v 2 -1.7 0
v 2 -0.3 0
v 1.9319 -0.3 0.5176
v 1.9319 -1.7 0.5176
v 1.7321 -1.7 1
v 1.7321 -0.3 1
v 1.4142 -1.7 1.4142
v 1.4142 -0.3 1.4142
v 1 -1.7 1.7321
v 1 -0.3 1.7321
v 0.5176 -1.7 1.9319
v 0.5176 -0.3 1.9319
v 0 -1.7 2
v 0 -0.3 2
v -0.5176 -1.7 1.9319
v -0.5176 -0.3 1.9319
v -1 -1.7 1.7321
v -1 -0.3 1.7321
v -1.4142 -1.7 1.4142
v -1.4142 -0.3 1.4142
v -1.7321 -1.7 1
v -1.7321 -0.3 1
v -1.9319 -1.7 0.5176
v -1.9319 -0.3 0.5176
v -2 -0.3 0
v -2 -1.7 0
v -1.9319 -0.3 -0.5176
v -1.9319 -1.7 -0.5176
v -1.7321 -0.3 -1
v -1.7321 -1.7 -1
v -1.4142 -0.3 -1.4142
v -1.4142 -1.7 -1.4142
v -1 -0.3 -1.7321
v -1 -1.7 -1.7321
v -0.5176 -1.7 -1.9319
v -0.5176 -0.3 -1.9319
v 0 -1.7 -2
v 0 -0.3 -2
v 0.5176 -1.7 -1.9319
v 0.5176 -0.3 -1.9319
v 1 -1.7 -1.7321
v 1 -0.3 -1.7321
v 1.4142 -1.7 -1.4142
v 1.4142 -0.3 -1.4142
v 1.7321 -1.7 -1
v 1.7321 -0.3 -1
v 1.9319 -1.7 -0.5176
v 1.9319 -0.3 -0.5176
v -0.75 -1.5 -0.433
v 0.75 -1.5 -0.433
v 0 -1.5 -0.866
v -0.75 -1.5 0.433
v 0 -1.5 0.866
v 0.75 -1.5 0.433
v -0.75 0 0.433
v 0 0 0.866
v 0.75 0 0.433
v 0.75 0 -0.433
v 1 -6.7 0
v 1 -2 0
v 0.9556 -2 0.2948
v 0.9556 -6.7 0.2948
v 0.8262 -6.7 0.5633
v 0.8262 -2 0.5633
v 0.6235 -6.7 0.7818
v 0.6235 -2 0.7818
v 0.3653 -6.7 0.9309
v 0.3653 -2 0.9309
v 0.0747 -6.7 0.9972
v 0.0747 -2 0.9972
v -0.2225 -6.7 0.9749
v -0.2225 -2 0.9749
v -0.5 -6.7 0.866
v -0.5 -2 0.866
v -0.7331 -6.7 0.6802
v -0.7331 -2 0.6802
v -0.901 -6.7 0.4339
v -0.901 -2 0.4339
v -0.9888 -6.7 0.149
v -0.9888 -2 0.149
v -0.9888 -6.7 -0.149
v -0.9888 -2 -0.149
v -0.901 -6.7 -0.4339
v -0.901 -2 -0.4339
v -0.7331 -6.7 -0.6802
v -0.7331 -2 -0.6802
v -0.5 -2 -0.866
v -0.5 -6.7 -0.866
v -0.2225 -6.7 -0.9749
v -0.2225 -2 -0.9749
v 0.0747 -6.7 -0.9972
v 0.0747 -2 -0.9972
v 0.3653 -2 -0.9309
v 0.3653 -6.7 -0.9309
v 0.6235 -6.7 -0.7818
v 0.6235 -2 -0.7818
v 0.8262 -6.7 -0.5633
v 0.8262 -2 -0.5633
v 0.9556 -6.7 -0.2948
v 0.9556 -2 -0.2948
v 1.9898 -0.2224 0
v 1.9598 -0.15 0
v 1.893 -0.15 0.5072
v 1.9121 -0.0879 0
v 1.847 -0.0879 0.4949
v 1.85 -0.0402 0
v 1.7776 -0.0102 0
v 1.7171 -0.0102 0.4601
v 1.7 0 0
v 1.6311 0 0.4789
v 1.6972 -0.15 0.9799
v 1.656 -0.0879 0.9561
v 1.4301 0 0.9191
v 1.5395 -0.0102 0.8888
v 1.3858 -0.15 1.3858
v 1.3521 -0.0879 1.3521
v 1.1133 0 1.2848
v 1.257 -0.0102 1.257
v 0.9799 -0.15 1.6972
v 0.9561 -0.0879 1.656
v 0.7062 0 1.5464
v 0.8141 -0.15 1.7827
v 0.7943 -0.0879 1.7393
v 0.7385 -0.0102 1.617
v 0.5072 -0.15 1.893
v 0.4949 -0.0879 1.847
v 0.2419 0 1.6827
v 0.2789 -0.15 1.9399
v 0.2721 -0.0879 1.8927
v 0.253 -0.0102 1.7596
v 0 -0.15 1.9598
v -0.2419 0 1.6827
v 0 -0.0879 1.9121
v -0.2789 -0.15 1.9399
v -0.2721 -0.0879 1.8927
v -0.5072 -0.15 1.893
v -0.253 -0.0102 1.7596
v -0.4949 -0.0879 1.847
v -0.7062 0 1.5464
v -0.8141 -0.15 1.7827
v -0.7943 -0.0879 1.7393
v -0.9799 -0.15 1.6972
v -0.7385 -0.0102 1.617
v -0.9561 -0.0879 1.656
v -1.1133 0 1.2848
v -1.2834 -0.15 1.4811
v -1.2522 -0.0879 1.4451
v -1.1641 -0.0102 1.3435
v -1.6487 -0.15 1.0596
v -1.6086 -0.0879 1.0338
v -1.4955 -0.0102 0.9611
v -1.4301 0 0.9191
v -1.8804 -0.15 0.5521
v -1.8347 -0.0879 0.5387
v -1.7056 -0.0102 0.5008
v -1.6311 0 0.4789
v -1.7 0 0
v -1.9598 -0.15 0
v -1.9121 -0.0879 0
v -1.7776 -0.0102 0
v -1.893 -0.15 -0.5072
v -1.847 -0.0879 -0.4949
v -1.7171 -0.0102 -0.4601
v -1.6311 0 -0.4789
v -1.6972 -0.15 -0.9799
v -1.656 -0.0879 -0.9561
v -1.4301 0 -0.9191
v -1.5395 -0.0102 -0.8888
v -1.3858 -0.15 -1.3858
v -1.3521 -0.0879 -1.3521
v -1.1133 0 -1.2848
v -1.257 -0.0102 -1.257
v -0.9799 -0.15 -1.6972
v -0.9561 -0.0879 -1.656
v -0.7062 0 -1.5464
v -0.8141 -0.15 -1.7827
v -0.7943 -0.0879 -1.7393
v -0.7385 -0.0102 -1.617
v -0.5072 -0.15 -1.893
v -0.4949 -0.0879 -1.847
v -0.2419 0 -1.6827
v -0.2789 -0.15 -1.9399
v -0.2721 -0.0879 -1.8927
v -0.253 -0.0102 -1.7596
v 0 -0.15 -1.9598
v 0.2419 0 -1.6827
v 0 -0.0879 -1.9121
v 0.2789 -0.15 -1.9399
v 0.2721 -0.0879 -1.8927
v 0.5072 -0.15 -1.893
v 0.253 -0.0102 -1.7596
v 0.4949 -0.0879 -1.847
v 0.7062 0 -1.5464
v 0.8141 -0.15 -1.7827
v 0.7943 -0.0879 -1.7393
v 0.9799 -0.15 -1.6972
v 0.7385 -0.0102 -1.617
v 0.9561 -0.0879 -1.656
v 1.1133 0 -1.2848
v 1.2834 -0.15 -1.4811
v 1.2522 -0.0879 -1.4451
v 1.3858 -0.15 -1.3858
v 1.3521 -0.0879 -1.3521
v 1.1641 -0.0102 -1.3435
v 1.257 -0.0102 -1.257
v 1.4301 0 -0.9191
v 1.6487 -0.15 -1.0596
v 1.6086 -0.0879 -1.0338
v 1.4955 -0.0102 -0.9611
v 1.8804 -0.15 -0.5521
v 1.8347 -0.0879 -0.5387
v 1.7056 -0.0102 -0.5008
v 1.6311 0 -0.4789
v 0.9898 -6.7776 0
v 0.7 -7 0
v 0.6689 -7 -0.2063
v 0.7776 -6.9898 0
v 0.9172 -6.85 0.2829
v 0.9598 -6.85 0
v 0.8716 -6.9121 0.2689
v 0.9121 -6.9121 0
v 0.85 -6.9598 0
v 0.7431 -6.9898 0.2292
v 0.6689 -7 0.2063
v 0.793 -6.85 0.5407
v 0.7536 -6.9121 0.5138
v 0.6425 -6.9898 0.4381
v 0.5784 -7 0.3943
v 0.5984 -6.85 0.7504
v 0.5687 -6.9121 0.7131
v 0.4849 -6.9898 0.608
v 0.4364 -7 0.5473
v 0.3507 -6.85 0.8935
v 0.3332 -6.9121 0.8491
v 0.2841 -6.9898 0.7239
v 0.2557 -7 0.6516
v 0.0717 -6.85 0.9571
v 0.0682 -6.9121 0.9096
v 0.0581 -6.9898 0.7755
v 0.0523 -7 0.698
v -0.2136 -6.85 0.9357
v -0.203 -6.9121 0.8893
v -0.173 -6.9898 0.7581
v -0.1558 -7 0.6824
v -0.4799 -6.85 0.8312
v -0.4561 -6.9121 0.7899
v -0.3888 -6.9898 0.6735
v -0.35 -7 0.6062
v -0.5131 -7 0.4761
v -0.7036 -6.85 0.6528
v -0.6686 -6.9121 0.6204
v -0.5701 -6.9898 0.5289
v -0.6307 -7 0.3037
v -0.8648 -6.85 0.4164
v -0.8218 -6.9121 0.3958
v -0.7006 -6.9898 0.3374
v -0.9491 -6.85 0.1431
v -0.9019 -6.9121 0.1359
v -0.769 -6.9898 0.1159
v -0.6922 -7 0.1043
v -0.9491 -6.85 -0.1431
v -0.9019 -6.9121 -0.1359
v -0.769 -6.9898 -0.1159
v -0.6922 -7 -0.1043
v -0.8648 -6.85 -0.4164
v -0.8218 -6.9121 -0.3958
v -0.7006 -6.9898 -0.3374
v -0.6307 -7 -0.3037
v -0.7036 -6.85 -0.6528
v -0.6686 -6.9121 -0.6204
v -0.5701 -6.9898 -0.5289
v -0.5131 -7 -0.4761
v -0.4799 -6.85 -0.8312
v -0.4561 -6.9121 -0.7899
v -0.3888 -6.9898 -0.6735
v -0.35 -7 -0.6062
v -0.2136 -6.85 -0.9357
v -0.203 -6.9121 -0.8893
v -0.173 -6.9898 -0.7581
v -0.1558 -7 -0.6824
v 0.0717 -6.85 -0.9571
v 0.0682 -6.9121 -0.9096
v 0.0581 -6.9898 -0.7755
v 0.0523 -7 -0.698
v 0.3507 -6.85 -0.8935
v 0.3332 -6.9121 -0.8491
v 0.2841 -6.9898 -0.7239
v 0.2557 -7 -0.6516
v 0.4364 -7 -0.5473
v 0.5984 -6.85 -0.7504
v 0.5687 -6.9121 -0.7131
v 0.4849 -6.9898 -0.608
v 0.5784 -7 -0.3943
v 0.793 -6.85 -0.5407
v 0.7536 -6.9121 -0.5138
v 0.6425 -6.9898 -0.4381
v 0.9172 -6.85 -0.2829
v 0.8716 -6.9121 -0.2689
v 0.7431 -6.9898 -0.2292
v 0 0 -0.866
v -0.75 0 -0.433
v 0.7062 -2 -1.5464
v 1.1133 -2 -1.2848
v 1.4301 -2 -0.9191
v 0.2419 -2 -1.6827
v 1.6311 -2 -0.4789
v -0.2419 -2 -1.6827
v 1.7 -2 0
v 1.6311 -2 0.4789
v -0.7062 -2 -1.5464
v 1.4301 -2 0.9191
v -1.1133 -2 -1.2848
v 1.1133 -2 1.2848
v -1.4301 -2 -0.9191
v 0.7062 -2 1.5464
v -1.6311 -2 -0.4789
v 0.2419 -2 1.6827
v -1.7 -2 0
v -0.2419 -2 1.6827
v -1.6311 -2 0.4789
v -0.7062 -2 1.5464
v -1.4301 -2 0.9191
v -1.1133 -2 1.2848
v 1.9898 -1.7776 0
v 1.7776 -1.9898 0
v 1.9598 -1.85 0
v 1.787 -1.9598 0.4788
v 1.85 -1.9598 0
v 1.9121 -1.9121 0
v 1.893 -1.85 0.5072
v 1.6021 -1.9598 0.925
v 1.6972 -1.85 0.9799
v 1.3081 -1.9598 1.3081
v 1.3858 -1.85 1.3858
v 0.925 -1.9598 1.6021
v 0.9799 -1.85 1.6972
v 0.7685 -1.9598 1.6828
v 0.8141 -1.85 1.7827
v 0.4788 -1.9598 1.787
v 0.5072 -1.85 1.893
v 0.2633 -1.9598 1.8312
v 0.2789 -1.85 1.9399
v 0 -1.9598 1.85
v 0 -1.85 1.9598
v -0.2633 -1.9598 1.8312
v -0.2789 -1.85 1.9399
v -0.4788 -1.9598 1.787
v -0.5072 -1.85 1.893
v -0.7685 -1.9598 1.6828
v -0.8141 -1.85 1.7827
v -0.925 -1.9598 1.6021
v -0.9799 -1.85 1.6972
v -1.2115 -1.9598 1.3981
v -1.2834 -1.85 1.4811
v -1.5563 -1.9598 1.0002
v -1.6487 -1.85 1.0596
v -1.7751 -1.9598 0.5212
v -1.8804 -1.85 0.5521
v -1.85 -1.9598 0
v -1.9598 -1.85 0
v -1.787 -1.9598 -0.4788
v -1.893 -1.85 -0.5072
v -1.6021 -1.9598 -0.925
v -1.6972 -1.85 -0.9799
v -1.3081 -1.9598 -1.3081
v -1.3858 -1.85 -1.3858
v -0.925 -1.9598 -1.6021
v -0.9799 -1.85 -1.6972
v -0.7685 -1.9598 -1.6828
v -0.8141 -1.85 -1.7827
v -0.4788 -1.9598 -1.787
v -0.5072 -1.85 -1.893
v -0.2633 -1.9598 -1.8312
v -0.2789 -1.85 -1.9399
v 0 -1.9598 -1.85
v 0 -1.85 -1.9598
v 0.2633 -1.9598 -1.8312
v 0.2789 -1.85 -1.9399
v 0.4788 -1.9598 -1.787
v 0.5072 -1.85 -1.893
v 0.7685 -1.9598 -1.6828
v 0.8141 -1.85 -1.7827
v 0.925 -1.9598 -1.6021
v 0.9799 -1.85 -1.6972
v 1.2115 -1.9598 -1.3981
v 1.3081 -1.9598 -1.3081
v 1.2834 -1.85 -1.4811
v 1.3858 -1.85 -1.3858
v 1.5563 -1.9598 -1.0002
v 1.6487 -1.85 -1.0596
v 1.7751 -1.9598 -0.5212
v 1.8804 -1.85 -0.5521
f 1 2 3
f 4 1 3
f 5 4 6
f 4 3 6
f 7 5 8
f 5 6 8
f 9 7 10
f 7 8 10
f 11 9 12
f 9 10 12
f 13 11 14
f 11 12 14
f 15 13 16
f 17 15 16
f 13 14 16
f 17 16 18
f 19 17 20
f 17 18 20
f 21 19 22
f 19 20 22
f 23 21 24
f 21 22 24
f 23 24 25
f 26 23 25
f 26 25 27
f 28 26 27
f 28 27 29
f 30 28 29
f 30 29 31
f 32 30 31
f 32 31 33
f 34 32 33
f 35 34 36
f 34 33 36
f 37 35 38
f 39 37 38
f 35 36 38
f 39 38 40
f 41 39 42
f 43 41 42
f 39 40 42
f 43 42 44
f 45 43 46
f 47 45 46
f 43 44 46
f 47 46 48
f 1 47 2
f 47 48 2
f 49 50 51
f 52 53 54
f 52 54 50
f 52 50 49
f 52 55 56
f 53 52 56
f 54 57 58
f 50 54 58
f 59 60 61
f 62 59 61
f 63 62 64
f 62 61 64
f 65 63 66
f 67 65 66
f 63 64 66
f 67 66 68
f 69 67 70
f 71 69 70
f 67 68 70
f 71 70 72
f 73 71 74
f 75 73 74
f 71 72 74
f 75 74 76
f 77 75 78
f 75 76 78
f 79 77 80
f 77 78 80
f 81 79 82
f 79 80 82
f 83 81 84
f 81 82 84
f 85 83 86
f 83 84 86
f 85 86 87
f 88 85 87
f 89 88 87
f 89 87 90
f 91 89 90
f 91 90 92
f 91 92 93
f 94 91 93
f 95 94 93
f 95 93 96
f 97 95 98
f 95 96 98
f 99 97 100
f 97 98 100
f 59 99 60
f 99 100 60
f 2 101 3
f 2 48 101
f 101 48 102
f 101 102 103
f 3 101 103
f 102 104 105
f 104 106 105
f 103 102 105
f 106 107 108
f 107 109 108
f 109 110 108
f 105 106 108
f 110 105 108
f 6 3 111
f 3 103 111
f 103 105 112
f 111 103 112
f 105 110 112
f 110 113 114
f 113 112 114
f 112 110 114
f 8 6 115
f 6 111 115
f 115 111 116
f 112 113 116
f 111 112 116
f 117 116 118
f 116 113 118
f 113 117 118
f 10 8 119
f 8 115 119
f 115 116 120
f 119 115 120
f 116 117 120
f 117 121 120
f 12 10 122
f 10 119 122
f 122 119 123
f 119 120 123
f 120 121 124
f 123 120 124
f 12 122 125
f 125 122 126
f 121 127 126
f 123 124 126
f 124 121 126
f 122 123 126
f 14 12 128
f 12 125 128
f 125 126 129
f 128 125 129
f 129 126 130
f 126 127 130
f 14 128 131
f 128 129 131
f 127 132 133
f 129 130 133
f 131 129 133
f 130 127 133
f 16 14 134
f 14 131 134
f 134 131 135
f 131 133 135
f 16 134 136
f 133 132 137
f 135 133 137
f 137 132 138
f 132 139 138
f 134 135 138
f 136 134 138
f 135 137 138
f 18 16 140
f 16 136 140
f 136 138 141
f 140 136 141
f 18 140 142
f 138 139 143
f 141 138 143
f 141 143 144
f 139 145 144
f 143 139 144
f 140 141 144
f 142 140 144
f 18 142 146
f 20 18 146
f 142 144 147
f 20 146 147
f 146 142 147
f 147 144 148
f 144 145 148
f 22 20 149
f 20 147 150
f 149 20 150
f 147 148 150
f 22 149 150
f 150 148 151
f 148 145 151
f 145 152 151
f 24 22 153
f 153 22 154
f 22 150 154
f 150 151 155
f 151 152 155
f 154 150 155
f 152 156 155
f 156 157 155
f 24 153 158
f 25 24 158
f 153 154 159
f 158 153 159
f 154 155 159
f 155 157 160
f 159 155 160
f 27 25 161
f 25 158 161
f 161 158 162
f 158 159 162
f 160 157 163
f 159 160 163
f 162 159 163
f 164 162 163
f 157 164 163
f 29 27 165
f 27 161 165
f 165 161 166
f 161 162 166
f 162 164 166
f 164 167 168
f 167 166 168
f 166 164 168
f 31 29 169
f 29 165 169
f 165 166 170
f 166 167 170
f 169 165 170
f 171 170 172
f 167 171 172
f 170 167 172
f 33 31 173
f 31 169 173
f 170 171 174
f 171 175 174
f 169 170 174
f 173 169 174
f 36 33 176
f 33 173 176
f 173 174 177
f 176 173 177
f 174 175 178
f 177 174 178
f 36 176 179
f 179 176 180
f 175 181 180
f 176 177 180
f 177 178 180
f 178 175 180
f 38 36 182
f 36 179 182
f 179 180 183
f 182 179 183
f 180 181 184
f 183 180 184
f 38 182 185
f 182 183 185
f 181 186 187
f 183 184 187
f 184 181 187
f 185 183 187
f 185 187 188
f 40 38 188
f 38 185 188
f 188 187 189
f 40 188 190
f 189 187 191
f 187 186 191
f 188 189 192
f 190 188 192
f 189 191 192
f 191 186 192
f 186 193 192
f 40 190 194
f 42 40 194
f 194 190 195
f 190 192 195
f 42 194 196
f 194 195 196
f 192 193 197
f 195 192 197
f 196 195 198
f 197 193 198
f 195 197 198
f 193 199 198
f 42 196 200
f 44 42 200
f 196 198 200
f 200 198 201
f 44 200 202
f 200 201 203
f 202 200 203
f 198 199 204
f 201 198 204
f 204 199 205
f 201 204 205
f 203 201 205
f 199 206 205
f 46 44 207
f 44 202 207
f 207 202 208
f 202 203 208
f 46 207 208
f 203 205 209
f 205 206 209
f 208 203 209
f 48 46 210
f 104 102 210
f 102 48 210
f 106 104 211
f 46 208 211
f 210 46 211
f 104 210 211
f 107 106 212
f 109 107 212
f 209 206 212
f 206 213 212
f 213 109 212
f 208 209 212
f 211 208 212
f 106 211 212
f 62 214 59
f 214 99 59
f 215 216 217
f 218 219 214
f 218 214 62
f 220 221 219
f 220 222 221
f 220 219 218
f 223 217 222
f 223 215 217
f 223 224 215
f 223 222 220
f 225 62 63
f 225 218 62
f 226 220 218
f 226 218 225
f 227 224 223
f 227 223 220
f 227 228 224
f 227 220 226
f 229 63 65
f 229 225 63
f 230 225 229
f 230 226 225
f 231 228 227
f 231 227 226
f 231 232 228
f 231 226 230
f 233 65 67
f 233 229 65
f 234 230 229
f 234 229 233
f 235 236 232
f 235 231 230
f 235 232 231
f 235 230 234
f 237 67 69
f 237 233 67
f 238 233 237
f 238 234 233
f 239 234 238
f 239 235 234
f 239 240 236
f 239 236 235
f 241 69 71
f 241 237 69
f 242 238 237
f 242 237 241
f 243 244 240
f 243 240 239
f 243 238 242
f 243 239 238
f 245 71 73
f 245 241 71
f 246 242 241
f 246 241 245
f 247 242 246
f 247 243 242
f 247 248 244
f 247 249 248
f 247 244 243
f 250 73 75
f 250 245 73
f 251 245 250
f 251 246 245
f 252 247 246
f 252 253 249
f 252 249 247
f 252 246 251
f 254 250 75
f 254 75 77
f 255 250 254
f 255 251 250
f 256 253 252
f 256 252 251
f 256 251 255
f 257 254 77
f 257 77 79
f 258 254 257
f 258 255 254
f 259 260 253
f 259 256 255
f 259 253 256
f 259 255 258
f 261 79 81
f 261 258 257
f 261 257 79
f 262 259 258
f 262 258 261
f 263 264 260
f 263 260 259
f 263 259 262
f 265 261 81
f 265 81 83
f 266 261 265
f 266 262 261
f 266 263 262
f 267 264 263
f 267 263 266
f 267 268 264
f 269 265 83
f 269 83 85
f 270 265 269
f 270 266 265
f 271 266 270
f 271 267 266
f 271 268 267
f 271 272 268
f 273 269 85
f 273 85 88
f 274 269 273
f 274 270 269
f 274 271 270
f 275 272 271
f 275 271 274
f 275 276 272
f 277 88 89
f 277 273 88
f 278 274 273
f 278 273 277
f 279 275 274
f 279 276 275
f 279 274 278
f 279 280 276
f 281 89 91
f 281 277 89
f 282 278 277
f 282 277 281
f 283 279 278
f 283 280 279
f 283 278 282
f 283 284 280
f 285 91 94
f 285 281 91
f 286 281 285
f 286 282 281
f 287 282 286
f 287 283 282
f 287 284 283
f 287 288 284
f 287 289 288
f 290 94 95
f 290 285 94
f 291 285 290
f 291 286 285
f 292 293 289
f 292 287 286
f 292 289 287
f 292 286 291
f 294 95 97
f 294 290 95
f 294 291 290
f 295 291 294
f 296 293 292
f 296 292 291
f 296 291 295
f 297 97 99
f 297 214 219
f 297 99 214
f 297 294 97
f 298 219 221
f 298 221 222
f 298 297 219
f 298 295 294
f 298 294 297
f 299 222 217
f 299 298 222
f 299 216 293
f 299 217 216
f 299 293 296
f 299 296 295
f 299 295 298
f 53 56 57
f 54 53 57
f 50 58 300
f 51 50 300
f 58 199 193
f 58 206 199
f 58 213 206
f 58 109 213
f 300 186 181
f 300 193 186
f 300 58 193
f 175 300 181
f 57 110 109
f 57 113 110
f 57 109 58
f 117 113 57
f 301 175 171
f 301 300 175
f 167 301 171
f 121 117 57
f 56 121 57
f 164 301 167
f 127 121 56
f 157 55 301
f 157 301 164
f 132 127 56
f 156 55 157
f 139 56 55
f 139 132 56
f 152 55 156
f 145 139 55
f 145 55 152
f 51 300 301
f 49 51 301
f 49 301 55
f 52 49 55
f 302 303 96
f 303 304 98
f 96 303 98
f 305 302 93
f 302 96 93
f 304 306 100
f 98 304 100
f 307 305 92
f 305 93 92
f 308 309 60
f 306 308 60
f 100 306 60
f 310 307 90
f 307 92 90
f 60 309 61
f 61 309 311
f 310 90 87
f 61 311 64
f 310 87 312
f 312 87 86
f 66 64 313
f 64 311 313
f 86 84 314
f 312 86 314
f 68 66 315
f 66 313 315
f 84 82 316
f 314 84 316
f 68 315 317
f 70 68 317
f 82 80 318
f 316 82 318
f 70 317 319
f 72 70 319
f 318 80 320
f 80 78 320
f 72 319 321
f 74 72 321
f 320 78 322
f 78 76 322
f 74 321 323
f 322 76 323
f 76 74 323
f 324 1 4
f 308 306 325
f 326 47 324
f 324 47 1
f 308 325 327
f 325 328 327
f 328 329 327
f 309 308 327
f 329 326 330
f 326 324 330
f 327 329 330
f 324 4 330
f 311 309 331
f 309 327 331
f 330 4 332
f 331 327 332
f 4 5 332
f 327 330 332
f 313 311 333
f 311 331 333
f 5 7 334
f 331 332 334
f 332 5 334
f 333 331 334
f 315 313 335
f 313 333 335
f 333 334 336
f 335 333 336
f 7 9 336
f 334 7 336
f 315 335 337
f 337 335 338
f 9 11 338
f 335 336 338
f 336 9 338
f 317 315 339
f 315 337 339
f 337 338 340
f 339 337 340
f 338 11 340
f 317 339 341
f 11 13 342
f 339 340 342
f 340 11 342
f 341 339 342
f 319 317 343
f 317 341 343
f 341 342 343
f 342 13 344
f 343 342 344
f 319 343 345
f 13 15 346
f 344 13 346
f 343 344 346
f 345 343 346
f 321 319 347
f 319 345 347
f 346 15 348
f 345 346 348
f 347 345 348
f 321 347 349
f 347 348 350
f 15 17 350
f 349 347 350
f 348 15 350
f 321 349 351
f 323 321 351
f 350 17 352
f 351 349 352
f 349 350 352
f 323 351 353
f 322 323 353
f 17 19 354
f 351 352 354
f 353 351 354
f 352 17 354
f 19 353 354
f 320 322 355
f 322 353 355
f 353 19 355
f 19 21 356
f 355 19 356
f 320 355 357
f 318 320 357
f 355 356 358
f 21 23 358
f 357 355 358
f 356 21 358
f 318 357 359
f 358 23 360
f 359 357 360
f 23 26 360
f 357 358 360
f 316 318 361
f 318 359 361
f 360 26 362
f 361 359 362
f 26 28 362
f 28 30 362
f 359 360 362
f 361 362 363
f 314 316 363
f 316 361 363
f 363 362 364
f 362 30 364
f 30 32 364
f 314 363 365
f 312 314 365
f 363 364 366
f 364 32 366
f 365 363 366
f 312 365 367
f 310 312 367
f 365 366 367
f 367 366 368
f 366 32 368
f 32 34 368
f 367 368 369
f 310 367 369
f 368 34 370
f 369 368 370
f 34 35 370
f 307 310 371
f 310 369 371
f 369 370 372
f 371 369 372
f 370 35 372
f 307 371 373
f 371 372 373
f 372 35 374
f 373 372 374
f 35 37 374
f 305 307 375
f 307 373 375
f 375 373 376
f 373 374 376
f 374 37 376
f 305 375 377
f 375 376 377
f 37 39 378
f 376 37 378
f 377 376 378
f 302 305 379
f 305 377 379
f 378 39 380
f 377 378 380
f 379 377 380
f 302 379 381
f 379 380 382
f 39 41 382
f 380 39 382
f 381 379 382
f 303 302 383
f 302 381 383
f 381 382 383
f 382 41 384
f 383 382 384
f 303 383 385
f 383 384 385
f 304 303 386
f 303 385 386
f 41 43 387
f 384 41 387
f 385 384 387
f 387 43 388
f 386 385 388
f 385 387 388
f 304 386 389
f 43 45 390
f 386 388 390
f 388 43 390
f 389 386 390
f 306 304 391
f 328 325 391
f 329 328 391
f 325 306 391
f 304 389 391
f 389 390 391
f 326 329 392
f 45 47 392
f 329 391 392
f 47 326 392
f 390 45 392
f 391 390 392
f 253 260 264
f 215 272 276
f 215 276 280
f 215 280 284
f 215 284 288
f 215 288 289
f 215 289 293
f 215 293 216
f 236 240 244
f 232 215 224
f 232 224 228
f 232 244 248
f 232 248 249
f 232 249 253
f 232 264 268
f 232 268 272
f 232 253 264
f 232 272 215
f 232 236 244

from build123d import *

# Parameters (mm, degrees)
SKETCH_1_W          = 2
SKETCH_1_H          = 2
SKETCH_2_R          = 1
EXTRUDE_1_DEPTH     = 5
CUT_EXTRUDE_1_DEPTH = 1.5
FILLET_1_R          = 0.3


with BuildPart() as part:
    # 草图1 → 旋转1 (revolve)
    with BuildSketch(Plane.XY):
        with Locations((1, -1)):
            Rectangle(SKETCH_1_W, SKETCH_1_H)
    revolve(axis=Axis((0, 0, 0), (0, -1, 0)))

    # 草图2 → 凸台-拉伸1 (add)
    with BuildSketch(Plane.XZ.offset(2)):
        Circle(SKETCH_2_R)
    extrude(amount=EXTRUDE_1_DEPTH)

    # 草图3 → 切除-拉伸1 (cut)
    with BuildSketch(Plane(origin=(0, 0, 0), x_dir=(-1, 0, 0), z_dir=(0, 1, 0))):
        Polygon((0, -0.866025404), (0.75, -0.433012702), (0.75, 0.433012702), (0, 0.866025404), (-0.75, 0.433012702), (-0.75, -0.433012702), align=None)
    extrude(amount=-CUT_EXTRUDE_1_DEPTH, mode=Mode.SUBTRACT)

    # 圆角1
    fillet_1_edges = [part.edges().sort_by_distance(p)[0] for p in [
        (-1, -7, 0),
        (-2, -2, 0),
        (-2, 0, 0),
    ]]
    fillet(fillet_1_edges, radius=FILLET_1_R)


solid = part.part
